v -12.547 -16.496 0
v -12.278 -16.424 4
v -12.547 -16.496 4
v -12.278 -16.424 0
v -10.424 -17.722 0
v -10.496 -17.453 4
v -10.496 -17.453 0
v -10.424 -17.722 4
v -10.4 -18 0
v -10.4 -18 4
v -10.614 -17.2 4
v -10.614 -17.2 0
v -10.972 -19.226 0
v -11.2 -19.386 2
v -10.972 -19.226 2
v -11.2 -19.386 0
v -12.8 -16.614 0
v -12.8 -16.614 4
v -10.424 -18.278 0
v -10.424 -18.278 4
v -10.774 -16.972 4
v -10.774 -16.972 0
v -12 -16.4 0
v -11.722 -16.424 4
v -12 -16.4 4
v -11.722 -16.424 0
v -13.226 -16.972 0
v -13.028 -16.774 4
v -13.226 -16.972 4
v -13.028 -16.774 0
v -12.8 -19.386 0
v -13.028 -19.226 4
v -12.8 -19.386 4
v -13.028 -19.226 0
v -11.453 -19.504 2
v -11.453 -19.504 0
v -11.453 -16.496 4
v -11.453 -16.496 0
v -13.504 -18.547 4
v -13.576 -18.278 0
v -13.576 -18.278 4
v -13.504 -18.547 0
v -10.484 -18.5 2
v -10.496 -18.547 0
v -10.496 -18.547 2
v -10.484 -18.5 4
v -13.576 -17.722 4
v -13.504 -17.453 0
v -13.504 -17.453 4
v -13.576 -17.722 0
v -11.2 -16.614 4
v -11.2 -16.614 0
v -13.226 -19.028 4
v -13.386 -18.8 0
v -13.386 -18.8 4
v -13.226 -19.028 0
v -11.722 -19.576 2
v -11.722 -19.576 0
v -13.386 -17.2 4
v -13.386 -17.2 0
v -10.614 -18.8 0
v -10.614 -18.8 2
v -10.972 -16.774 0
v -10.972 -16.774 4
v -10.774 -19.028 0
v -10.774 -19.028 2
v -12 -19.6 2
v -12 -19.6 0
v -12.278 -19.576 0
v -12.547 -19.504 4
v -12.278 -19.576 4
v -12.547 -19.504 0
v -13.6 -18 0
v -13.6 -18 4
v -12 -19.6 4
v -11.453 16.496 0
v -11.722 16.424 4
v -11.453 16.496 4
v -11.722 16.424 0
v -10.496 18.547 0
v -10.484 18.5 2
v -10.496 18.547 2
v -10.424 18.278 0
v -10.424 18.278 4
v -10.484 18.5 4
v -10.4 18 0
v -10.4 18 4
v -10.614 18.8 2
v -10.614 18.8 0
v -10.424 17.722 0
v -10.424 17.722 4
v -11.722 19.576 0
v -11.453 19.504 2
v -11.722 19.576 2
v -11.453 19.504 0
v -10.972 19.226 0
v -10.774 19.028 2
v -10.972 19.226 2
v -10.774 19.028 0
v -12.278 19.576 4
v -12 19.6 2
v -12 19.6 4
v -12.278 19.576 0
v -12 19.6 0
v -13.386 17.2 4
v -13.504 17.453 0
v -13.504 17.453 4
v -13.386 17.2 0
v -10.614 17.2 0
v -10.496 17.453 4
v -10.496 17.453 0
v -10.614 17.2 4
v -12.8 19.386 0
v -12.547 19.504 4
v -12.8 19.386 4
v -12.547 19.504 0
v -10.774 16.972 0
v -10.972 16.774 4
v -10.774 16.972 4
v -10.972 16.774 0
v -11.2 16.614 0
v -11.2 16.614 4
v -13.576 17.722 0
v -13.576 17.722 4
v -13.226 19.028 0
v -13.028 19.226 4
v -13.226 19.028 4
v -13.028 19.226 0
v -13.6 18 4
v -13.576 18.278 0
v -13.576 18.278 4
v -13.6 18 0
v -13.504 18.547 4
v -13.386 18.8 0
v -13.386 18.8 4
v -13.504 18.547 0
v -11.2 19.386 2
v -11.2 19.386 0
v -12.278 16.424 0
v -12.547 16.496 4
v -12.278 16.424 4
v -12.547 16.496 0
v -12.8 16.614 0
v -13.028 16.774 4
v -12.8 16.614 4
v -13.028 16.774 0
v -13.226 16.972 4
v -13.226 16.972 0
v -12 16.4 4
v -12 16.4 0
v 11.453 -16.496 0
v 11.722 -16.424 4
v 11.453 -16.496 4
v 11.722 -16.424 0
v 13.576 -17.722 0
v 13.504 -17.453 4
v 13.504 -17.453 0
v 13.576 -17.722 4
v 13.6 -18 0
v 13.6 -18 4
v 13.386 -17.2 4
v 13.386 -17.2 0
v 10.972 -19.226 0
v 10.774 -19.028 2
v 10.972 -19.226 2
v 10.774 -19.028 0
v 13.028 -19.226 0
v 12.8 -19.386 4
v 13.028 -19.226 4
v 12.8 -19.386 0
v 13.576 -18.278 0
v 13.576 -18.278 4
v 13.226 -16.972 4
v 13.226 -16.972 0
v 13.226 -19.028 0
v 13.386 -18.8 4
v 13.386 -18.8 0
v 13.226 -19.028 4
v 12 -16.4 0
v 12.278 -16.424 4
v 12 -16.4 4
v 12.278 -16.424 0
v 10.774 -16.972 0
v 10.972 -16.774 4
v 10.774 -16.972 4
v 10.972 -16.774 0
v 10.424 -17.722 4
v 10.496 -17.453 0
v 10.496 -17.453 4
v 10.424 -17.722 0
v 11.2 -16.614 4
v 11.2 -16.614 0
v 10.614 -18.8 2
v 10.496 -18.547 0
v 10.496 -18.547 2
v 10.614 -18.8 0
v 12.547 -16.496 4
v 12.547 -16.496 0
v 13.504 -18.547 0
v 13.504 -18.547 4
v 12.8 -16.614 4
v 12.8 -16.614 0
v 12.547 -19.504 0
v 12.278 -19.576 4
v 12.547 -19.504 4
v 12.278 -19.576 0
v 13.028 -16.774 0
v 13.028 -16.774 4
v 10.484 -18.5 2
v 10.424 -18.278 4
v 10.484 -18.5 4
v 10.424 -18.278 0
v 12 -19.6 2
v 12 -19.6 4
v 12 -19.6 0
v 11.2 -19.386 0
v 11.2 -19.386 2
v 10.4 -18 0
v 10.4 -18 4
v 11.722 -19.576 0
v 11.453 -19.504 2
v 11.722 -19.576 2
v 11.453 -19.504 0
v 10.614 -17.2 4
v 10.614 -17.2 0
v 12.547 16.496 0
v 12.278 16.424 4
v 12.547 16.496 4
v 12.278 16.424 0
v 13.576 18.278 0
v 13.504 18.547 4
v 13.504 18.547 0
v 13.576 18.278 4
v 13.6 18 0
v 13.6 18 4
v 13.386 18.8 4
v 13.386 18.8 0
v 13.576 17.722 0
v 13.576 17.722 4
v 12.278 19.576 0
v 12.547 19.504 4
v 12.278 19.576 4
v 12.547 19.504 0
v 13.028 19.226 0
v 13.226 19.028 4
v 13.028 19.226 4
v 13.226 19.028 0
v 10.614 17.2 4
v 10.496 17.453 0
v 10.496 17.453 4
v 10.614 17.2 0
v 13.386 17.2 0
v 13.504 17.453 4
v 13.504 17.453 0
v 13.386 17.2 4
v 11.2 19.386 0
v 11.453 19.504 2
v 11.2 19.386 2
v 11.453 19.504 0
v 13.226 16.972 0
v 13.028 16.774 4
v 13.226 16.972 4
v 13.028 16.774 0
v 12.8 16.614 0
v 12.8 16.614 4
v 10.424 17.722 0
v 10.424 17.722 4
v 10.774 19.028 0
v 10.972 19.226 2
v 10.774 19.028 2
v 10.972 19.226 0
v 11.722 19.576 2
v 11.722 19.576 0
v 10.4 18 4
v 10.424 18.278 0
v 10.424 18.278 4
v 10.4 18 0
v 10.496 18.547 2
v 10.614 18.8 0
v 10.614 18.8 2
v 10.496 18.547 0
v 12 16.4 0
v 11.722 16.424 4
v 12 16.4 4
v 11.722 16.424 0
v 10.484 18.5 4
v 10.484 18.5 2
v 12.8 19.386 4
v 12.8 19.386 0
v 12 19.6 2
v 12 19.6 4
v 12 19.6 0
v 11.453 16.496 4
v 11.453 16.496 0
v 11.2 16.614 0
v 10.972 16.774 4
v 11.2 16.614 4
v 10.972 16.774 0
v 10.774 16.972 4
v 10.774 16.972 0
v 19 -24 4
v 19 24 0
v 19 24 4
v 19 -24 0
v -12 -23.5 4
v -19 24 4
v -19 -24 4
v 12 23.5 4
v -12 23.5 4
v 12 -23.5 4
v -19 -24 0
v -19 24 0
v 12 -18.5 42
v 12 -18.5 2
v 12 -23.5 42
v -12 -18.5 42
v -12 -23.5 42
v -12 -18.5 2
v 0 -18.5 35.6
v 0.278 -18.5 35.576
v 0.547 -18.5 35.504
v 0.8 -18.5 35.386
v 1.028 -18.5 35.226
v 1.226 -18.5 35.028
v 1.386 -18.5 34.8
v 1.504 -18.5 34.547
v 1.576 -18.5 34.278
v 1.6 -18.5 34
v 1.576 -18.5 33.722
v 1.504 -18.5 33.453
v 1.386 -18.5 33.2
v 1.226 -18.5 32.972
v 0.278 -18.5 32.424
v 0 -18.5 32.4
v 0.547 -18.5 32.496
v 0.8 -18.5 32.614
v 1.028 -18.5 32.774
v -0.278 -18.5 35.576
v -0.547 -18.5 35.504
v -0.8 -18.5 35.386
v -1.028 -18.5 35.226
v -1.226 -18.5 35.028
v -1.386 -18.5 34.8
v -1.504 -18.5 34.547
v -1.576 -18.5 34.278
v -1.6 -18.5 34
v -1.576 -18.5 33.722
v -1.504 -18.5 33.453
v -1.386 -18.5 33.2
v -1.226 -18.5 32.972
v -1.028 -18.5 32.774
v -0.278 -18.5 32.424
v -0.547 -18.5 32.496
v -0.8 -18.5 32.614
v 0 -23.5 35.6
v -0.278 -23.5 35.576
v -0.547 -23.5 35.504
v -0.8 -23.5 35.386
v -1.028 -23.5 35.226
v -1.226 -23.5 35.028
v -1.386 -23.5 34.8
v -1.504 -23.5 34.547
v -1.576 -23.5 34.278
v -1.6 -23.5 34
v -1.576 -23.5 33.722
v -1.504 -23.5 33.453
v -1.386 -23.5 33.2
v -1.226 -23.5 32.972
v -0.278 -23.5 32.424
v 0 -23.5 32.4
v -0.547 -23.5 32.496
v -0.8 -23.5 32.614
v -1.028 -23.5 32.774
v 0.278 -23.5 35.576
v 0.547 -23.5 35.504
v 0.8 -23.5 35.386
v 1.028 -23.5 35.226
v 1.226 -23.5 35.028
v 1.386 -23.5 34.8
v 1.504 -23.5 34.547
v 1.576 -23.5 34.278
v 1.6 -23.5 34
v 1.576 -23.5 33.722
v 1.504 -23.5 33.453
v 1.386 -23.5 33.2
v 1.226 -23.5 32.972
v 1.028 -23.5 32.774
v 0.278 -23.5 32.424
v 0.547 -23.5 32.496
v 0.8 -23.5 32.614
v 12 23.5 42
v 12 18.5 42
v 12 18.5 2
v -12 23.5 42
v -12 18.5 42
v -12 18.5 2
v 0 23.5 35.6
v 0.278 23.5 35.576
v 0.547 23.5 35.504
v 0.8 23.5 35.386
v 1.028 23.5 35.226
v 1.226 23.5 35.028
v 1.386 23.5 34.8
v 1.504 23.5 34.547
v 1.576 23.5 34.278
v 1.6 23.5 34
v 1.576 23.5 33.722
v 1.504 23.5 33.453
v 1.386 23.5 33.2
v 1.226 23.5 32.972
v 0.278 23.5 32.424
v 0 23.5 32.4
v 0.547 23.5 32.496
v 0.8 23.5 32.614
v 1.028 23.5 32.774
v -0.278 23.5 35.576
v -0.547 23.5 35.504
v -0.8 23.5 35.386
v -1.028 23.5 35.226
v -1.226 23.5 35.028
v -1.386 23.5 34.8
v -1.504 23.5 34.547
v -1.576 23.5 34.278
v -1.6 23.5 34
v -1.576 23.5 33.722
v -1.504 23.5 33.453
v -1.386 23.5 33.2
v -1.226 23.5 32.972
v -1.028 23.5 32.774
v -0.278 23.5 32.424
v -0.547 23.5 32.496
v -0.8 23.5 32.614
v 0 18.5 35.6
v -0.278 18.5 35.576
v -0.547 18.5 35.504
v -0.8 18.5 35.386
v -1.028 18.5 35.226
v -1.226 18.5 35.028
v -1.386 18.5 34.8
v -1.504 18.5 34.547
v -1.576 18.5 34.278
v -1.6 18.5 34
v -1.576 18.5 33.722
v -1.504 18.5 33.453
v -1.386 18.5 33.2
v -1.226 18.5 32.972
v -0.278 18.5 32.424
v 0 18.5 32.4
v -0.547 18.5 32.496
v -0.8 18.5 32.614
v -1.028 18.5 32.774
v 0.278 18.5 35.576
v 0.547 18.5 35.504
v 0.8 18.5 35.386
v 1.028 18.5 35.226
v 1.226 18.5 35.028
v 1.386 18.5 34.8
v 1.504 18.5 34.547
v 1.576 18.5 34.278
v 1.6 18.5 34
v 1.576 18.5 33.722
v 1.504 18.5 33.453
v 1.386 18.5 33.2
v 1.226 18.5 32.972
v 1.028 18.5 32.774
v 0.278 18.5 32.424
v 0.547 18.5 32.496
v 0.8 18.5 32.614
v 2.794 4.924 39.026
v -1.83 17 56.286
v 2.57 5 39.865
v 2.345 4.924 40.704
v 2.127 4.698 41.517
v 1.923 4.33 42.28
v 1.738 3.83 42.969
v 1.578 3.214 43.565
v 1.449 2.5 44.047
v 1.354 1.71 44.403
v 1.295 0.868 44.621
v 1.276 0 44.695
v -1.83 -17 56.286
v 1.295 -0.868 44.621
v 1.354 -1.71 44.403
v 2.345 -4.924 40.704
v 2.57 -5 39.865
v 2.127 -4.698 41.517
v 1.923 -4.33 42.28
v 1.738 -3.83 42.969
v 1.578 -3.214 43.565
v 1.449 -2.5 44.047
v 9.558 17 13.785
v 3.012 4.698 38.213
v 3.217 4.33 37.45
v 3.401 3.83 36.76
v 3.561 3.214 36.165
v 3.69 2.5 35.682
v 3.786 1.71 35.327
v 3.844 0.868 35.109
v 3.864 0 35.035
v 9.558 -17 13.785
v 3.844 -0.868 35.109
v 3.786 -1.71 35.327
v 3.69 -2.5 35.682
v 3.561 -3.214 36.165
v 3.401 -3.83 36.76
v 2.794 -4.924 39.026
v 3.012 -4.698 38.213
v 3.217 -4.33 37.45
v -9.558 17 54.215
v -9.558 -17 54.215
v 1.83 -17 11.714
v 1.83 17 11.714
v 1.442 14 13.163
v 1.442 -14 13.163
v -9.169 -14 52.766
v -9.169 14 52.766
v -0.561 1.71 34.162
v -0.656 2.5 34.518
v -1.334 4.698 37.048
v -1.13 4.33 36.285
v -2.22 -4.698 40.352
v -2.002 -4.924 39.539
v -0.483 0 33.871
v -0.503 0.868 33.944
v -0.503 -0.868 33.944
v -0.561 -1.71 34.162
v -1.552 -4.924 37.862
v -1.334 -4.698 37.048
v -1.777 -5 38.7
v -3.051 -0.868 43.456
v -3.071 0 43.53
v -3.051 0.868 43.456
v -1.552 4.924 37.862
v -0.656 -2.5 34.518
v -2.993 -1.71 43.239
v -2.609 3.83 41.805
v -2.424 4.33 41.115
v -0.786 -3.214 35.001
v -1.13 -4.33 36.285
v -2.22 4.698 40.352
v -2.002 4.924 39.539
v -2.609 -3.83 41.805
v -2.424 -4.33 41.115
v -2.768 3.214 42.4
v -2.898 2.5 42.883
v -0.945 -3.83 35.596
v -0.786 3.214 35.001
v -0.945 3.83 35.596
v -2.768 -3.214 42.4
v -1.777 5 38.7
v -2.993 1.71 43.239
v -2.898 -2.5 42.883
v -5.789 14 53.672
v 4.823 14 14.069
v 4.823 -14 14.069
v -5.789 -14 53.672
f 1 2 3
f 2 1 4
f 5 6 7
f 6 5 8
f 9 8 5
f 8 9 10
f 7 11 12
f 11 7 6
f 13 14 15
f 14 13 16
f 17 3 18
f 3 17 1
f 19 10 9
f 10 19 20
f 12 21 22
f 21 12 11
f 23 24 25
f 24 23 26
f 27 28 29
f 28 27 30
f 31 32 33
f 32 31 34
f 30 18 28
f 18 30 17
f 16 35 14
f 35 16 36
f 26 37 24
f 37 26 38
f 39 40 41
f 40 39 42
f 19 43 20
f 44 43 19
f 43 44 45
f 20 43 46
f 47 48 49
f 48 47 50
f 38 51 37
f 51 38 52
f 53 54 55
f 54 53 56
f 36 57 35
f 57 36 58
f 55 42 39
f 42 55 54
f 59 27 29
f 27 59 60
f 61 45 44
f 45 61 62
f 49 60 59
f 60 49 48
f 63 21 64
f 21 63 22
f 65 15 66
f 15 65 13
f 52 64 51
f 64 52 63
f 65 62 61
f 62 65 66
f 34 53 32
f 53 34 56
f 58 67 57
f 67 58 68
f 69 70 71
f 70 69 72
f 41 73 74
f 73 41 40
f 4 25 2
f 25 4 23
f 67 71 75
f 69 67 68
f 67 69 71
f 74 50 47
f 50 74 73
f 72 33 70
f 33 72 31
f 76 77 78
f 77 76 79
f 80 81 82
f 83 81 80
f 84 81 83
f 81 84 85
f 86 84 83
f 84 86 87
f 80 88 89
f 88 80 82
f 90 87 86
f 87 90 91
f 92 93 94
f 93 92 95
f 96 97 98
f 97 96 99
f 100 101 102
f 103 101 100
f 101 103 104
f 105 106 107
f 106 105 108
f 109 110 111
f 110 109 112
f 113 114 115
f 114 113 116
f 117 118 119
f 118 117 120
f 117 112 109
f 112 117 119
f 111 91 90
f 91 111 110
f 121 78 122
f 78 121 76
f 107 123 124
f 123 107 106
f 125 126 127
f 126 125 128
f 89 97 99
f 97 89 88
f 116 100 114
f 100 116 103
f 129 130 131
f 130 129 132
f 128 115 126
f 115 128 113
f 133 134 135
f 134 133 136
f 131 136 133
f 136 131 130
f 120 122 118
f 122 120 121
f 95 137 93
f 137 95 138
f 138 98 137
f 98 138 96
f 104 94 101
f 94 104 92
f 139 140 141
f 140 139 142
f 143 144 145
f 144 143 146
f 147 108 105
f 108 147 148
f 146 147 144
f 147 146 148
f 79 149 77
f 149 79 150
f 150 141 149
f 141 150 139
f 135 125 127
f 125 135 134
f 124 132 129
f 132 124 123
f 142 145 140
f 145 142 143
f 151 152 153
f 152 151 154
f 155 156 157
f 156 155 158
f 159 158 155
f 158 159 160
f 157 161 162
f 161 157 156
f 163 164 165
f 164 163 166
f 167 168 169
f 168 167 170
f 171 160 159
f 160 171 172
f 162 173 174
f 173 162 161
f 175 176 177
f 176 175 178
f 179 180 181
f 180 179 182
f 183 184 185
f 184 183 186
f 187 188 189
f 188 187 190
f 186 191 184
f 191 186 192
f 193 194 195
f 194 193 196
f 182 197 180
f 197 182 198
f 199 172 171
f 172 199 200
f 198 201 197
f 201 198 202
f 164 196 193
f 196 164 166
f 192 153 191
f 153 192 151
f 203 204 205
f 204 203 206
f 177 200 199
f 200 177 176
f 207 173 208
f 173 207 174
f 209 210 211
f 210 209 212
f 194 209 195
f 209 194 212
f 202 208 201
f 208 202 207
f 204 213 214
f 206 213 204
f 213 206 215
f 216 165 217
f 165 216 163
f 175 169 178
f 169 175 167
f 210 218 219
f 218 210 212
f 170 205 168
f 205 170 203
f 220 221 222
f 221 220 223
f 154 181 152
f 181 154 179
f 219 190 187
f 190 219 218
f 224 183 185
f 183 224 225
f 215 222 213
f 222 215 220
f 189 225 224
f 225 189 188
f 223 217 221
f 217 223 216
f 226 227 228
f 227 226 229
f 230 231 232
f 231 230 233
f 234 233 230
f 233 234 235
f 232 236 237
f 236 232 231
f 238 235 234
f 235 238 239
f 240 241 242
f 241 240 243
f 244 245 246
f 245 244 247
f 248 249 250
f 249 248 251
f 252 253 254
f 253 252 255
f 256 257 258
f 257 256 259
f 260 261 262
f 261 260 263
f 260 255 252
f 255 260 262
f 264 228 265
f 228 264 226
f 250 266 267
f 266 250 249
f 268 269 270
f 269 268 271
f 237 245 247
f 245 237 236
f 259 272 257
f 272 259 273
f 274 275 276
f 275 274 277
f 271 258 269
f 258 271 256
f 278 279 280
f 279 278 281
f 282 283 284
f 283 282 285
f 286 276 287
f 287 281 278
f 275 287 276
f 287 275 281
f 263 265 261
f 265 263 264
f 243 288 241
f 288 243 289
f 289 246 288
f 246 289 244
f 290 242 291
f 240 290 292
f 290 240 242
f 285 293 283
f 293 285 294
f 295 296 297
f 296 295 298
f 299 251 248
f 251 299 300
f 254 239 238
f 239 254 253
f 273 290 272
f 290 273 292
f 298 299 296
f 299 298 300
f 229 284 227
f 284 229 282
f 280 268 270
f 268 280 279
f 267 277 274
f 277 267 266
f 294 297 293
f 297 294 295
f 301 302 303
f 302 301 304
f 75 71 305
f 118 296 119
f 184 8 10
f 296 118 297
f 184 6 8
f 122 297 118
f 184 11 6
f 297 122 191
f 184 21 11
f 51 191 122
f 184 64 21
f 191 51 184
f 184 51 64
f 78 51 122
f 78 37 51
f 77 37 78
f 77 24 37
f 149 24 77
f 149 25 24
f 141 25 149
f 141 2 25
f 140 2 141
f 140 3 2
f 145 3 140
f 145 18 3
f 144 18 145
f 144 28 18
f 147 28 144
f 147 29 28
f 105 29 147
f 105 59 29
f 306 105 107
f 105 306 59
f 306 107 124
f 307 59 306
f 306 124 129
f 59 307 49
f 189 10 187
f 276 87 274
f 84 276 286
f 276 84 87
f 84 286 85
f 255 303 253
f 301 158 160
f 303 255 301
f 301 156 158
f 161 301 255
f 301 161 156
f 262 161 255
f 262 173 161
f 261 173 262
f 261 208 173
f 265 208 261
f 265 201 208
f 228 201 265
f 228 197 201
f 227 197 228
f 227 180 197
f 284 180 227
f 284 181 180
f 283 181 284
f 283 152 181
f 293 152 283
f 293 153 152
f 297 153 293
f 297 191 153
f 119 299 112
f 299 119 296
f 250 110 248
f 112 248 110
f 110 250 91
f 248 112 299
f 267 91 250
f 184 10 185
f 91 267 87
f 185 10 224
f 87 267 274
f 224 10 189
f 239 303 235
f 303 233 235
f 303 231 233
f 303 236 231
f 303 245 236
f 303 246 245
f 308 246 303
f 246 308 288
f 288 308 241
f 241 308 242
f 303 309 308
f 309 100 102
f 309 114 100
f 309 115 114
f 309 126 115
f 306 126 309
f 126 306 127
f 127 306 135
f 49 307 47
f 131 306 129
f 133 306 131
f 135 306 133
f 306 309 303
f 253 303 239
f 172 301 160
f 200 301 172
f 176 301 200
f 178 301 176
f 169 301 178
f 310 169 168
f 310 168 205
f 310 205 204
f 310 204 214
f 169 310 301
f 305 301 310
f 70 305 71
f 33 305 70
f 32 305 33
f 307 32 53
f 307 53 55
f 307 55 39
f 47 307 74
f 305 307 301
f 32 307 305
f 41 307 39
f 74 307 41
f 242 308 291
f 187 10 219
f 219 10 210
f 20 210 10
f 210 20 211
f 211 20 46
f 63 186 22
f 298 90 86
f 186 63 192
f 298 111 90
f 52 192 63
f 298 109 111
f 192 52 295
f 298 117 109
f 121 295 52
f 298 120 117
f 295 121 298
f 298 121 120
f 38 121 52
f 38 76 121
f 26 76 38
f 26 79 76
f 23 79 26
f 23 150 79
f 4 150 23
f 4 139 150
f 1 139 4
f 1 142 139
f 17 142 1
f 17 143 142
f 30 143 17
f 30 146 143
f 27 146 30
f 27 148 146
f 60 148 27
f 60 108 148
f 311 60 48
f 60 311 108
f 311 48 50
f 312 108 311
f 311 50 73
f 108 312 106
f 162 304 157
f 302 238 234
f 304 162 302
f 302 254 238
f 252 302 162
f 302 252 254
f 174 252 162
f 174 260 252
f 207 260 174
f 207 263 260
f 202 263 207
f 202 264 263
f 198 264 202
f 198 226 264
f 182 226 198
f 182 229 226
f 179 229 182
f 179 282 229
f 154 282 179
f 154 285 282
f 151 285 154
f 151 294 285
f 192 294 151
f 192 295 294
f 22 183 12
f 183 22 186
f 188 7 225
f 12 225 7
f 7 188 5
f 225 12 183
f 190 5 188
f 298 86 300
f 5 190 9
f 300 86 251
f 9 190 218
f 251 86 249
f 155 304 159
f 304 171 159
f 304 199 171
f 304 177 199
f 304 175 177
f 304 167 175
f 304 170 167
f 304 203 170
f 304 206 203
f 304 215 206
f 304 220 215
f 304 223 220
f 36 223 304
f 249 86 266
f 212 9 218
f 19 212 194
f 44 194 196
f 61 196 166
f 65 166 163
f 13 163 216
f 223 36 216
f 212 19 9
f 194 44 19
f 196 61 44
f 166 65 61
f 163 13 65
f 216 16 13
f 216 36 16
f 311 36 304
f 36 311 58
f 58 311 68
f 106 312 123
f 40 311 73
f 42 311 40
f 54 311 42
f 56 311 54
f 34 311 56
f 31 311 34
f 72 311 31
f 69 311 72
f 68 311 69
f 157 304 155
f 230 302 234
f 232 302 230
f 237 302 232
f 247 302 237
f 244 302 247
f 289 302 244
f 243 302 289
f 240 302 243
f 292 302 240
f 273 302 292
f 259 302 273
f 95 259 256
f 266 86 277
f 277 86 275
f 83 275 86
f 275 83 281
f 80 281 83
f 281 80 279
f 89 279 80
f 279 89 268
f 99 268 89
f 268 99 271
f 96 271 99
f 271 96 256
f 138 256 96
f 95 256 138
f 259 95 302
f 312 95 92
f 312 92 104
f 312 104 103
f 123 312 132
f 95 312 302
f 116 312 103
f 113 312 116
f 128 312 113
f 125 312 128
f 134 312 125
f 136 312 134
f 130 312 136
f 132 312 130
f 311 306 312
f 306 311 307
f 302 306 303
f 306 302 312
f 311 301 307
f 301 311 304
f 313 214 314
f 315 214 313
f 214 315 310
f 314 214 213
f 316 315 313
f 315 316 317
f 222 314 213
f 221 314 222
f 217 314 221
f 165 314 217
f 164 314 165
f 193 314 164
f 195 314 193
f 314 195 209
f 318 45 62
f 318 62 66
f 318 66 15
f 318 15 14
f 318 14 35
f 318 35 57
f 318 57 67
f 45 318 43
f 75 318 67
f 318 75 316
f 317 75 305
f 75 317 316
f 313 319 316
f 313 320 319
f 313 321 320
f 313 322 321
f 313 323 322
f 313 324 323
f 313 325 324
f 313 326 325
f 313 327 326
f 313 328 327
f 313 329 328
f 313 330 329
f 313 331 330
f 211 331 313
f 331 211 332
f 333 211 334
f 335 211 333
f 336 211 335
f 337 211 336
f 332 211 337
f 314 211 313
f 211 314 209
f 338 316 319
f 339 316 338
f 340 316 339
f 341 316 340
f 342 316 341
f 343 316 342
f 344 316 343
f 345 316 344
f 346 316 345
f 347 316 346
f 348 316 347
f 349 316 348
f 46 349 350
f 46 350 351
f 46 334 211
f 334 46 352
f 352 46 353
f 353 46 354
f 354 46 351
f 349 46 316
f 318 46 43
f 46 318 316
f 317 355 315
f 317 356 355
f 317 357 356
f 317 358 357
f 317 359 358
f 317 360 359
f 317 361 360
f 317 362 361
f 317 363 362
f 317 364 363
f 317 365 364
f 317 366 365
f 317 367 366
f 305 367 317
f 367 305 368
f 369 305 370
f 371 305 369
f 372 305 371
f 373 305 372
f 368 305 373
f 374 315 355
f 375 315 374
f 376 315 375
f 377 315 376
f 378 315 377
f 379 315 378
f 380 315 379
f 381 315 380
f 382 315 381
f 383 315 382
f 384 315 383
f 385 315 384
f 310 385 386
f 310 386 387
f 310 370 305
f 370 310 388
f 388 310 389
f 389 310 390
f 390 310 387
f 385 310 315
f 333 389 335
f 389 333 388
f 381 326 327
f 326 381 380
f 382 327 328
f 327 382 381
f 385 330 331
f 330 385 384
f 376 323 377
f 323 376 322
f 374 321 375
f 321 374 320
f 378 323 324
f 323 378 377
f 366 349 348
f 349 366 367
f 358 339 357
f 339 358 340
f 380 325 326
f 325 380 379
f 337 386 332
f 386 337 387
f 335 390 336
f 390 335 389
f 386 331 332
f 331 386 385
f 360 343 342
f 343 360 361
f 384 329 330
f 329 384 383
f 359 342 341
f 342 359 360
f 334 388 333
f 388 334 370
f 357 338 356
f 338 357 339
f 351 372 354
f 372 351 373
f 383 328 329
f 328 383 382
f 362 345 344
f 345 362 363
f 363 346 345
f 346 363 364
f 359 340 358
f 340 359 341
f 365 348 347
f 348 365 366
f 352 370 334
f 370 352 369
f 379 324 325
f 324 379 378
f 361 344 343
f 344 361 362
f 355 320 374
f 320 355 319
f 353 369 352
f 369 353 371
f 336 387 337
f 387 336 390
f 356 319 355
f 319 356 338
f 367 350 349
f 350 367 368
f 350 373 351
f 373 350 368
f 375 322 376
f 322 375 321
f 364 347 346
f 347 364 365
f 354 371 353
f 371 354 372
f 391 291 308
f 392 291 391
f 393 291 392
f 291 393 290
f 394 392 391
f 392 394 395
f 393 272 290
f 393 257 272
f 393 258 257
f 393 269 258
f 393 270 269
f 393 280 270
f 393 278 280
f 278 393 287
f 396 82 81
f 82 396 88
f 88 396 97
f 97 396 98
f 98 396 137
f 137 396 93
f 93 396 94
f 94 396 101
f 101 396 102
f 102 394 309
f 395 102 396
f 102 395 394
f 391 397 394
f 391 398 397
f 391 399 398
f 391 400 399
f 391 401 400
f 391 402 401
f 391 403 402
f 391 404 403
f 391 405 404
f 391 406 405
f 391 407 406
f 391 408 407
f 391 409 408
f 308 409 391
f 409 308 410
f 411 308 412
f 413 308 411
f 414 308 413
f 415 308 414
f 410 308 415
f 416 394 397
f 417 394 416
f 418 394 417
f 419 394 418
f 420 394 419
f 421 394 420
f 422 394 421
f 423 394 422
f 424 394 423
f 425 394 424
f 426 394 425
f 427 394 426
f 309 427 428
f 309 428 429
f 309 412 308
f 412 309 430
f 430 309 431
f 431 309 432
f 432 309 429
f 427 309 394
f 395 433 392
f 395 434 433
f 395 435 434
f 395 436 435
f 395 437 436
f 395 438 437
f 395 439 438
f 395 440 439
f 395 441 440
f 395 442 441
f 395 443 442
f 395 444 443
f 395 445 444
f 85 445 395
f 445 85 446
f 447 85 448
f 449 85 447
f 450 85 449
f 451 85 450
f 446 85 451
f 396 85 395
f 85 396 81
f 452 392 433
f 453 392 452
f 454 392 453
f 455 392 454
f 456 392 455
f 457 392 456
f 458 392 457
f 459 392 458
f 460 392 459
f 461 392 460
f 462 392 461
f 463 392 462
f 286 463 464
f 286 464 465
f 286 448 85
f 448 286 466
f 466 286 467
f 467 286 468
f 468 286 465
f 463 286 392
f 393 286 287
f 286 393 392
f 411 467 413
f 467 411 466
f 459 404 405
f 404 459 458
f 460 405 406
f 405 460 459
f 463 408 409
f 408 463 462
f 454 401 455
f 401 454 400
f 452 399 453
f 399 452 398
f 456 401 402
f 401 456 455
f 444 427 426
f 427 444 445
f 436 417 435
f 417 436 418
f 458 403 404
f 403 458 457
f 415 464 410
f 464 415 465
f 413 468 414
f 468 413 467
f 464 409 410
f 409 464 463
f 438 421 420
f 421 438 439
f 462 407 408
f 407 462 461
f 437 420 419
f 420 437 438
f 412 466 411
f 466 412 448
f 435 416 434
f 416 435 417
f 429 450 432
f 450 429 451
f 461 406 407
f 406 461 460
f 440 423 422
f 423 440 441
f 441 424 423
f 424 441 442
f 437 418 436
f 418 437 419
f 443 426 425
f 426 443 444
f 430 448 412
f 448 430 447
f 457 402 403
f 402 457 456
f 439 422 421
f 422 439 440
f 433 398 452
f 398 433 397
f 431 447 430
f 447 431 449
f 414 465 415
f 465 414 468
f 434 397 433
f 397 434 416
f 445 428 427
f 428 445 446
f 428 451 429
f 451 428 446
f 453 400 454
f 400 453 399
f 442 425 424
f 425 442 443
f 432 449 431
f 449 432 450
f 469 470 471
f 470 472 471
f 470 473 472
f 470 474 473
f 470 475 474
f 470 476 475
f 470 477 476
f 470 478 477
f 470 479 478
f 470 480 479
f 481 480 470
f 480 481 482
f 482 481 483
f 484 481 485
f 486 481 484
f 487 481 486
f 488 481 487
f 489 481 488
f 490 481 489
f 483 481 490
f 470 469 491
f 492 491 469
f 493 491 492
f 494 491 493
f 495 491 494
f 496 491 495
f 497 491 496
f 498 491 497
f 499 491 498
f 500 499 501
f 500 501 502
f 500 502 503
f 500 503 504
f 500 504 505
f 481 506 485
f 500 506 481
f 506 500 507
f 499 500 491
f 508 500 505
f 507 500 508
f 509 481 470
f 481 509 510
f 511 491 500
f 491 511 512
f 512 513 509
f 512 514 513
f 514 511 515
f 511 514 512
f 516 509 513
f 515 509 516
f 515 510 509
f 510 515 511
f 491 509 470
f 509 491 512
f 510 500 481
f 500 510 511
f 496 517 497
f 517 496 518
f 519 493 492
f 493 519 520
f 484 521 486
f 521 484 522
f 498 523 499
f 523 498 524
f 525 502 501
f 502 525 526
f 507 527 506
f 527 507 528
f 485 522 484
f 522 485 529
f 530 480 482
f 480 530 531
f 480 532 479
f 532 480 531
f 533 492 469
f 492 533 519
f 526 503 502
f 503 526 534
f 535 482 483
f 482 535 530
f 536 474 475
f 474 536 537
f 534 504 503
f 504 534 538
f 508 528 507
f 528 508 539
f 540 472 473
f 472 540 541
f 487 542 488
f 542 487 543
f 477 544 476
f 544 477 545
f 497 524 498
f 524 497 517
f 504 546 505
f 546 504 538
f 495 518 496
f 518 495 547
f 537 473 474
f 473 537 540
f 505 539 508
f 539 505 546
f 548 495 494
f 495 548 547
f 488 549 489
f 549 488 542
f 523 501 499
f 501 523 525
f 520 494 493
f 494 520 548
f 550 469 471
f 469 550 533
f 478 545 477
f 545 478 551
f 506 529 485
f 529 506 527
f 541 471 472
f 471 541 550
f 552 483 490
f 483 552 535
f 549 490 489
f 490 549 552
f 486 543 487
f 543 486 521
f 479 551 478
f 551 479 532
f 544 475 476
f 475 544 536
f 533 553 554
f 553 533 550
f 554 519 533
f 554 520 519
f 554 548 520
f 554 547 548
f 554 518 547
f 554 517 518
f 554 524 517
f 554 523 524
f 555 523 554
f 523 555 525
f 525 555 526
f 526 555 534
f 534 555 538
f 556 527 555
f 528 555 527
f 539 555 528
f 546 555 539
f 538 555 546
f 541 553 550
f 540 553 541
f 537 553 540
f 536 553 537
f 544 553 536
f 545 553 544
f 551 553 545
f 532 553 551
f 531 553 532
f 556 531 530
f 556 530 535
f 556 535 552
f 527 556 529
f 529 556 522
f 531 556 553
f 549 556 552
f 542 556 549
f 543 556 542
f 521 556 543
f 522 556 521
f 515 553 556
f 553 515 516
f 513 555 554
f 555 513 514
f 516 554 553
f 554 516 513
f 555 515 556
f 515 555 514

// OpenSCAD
// RoverSAR ESP32-CAM AI-Thinker Adjustable Tilt Bracket (0 to 45 deg pitch)
// Target nominal pitch: 15 deg downward for ground SAR victim & obstacle scanning

$fn = 36;

base_w = 48.0;
base_d = 38.0;
base_t = 4.0;
tower_h = 40.0;
cam_tilt_deg = -15.0;

module base_foot() {
    difference() {
        cube([base_d, base_w, base_t], center = true);
        for (sx = [-12, 12], sy = [-18, 18]) {
            translate([sx, sy, 0])
                cylinder(h = base_t + 1.0, d = 3.2, center = true);
        }
    }
}

module side_upright(sy) {
    translate([0, sy * 21.0, tower_h / 2 + base_t / 2]) {
        difference() {
            cube([24.0, 5.0, tower_h], center = true);
            translate([0, 0, tower_h / 2 - 8.0])
                rotate([90, 0, 0])
                    cylinder(h = 7.0, d = 3.2, center = true);
        }
    }
}

module cam_cradle() {
    // Holds 40.5mm x 27.0mm AI-Thinker ESP32-CAM PCB with OV2640 lens hole
    translate([0, 0, tower_h - 6.0])
        rotate([0, cam_tilt_deg, 0])
            difference() {
                cube([8.0, 34.0, 44.0], center = true);
                // OV2640 lens cutout
                translate([0, 0, 5.0])
                    rotate([0, 90, 0])
                        cylinder(h = 10.0, d = 10.0, center = true);
                // Rear PCB recess
                translate([-2.5, 0, 0])
                    cube([4.0, 28.0, 41.0], center = true);
            }
}

union() {
    translate([0, 0, base_t / 2]) base_foot();
    side_upright(-1);
    side_upright(1);
    cam_cradle();
}
